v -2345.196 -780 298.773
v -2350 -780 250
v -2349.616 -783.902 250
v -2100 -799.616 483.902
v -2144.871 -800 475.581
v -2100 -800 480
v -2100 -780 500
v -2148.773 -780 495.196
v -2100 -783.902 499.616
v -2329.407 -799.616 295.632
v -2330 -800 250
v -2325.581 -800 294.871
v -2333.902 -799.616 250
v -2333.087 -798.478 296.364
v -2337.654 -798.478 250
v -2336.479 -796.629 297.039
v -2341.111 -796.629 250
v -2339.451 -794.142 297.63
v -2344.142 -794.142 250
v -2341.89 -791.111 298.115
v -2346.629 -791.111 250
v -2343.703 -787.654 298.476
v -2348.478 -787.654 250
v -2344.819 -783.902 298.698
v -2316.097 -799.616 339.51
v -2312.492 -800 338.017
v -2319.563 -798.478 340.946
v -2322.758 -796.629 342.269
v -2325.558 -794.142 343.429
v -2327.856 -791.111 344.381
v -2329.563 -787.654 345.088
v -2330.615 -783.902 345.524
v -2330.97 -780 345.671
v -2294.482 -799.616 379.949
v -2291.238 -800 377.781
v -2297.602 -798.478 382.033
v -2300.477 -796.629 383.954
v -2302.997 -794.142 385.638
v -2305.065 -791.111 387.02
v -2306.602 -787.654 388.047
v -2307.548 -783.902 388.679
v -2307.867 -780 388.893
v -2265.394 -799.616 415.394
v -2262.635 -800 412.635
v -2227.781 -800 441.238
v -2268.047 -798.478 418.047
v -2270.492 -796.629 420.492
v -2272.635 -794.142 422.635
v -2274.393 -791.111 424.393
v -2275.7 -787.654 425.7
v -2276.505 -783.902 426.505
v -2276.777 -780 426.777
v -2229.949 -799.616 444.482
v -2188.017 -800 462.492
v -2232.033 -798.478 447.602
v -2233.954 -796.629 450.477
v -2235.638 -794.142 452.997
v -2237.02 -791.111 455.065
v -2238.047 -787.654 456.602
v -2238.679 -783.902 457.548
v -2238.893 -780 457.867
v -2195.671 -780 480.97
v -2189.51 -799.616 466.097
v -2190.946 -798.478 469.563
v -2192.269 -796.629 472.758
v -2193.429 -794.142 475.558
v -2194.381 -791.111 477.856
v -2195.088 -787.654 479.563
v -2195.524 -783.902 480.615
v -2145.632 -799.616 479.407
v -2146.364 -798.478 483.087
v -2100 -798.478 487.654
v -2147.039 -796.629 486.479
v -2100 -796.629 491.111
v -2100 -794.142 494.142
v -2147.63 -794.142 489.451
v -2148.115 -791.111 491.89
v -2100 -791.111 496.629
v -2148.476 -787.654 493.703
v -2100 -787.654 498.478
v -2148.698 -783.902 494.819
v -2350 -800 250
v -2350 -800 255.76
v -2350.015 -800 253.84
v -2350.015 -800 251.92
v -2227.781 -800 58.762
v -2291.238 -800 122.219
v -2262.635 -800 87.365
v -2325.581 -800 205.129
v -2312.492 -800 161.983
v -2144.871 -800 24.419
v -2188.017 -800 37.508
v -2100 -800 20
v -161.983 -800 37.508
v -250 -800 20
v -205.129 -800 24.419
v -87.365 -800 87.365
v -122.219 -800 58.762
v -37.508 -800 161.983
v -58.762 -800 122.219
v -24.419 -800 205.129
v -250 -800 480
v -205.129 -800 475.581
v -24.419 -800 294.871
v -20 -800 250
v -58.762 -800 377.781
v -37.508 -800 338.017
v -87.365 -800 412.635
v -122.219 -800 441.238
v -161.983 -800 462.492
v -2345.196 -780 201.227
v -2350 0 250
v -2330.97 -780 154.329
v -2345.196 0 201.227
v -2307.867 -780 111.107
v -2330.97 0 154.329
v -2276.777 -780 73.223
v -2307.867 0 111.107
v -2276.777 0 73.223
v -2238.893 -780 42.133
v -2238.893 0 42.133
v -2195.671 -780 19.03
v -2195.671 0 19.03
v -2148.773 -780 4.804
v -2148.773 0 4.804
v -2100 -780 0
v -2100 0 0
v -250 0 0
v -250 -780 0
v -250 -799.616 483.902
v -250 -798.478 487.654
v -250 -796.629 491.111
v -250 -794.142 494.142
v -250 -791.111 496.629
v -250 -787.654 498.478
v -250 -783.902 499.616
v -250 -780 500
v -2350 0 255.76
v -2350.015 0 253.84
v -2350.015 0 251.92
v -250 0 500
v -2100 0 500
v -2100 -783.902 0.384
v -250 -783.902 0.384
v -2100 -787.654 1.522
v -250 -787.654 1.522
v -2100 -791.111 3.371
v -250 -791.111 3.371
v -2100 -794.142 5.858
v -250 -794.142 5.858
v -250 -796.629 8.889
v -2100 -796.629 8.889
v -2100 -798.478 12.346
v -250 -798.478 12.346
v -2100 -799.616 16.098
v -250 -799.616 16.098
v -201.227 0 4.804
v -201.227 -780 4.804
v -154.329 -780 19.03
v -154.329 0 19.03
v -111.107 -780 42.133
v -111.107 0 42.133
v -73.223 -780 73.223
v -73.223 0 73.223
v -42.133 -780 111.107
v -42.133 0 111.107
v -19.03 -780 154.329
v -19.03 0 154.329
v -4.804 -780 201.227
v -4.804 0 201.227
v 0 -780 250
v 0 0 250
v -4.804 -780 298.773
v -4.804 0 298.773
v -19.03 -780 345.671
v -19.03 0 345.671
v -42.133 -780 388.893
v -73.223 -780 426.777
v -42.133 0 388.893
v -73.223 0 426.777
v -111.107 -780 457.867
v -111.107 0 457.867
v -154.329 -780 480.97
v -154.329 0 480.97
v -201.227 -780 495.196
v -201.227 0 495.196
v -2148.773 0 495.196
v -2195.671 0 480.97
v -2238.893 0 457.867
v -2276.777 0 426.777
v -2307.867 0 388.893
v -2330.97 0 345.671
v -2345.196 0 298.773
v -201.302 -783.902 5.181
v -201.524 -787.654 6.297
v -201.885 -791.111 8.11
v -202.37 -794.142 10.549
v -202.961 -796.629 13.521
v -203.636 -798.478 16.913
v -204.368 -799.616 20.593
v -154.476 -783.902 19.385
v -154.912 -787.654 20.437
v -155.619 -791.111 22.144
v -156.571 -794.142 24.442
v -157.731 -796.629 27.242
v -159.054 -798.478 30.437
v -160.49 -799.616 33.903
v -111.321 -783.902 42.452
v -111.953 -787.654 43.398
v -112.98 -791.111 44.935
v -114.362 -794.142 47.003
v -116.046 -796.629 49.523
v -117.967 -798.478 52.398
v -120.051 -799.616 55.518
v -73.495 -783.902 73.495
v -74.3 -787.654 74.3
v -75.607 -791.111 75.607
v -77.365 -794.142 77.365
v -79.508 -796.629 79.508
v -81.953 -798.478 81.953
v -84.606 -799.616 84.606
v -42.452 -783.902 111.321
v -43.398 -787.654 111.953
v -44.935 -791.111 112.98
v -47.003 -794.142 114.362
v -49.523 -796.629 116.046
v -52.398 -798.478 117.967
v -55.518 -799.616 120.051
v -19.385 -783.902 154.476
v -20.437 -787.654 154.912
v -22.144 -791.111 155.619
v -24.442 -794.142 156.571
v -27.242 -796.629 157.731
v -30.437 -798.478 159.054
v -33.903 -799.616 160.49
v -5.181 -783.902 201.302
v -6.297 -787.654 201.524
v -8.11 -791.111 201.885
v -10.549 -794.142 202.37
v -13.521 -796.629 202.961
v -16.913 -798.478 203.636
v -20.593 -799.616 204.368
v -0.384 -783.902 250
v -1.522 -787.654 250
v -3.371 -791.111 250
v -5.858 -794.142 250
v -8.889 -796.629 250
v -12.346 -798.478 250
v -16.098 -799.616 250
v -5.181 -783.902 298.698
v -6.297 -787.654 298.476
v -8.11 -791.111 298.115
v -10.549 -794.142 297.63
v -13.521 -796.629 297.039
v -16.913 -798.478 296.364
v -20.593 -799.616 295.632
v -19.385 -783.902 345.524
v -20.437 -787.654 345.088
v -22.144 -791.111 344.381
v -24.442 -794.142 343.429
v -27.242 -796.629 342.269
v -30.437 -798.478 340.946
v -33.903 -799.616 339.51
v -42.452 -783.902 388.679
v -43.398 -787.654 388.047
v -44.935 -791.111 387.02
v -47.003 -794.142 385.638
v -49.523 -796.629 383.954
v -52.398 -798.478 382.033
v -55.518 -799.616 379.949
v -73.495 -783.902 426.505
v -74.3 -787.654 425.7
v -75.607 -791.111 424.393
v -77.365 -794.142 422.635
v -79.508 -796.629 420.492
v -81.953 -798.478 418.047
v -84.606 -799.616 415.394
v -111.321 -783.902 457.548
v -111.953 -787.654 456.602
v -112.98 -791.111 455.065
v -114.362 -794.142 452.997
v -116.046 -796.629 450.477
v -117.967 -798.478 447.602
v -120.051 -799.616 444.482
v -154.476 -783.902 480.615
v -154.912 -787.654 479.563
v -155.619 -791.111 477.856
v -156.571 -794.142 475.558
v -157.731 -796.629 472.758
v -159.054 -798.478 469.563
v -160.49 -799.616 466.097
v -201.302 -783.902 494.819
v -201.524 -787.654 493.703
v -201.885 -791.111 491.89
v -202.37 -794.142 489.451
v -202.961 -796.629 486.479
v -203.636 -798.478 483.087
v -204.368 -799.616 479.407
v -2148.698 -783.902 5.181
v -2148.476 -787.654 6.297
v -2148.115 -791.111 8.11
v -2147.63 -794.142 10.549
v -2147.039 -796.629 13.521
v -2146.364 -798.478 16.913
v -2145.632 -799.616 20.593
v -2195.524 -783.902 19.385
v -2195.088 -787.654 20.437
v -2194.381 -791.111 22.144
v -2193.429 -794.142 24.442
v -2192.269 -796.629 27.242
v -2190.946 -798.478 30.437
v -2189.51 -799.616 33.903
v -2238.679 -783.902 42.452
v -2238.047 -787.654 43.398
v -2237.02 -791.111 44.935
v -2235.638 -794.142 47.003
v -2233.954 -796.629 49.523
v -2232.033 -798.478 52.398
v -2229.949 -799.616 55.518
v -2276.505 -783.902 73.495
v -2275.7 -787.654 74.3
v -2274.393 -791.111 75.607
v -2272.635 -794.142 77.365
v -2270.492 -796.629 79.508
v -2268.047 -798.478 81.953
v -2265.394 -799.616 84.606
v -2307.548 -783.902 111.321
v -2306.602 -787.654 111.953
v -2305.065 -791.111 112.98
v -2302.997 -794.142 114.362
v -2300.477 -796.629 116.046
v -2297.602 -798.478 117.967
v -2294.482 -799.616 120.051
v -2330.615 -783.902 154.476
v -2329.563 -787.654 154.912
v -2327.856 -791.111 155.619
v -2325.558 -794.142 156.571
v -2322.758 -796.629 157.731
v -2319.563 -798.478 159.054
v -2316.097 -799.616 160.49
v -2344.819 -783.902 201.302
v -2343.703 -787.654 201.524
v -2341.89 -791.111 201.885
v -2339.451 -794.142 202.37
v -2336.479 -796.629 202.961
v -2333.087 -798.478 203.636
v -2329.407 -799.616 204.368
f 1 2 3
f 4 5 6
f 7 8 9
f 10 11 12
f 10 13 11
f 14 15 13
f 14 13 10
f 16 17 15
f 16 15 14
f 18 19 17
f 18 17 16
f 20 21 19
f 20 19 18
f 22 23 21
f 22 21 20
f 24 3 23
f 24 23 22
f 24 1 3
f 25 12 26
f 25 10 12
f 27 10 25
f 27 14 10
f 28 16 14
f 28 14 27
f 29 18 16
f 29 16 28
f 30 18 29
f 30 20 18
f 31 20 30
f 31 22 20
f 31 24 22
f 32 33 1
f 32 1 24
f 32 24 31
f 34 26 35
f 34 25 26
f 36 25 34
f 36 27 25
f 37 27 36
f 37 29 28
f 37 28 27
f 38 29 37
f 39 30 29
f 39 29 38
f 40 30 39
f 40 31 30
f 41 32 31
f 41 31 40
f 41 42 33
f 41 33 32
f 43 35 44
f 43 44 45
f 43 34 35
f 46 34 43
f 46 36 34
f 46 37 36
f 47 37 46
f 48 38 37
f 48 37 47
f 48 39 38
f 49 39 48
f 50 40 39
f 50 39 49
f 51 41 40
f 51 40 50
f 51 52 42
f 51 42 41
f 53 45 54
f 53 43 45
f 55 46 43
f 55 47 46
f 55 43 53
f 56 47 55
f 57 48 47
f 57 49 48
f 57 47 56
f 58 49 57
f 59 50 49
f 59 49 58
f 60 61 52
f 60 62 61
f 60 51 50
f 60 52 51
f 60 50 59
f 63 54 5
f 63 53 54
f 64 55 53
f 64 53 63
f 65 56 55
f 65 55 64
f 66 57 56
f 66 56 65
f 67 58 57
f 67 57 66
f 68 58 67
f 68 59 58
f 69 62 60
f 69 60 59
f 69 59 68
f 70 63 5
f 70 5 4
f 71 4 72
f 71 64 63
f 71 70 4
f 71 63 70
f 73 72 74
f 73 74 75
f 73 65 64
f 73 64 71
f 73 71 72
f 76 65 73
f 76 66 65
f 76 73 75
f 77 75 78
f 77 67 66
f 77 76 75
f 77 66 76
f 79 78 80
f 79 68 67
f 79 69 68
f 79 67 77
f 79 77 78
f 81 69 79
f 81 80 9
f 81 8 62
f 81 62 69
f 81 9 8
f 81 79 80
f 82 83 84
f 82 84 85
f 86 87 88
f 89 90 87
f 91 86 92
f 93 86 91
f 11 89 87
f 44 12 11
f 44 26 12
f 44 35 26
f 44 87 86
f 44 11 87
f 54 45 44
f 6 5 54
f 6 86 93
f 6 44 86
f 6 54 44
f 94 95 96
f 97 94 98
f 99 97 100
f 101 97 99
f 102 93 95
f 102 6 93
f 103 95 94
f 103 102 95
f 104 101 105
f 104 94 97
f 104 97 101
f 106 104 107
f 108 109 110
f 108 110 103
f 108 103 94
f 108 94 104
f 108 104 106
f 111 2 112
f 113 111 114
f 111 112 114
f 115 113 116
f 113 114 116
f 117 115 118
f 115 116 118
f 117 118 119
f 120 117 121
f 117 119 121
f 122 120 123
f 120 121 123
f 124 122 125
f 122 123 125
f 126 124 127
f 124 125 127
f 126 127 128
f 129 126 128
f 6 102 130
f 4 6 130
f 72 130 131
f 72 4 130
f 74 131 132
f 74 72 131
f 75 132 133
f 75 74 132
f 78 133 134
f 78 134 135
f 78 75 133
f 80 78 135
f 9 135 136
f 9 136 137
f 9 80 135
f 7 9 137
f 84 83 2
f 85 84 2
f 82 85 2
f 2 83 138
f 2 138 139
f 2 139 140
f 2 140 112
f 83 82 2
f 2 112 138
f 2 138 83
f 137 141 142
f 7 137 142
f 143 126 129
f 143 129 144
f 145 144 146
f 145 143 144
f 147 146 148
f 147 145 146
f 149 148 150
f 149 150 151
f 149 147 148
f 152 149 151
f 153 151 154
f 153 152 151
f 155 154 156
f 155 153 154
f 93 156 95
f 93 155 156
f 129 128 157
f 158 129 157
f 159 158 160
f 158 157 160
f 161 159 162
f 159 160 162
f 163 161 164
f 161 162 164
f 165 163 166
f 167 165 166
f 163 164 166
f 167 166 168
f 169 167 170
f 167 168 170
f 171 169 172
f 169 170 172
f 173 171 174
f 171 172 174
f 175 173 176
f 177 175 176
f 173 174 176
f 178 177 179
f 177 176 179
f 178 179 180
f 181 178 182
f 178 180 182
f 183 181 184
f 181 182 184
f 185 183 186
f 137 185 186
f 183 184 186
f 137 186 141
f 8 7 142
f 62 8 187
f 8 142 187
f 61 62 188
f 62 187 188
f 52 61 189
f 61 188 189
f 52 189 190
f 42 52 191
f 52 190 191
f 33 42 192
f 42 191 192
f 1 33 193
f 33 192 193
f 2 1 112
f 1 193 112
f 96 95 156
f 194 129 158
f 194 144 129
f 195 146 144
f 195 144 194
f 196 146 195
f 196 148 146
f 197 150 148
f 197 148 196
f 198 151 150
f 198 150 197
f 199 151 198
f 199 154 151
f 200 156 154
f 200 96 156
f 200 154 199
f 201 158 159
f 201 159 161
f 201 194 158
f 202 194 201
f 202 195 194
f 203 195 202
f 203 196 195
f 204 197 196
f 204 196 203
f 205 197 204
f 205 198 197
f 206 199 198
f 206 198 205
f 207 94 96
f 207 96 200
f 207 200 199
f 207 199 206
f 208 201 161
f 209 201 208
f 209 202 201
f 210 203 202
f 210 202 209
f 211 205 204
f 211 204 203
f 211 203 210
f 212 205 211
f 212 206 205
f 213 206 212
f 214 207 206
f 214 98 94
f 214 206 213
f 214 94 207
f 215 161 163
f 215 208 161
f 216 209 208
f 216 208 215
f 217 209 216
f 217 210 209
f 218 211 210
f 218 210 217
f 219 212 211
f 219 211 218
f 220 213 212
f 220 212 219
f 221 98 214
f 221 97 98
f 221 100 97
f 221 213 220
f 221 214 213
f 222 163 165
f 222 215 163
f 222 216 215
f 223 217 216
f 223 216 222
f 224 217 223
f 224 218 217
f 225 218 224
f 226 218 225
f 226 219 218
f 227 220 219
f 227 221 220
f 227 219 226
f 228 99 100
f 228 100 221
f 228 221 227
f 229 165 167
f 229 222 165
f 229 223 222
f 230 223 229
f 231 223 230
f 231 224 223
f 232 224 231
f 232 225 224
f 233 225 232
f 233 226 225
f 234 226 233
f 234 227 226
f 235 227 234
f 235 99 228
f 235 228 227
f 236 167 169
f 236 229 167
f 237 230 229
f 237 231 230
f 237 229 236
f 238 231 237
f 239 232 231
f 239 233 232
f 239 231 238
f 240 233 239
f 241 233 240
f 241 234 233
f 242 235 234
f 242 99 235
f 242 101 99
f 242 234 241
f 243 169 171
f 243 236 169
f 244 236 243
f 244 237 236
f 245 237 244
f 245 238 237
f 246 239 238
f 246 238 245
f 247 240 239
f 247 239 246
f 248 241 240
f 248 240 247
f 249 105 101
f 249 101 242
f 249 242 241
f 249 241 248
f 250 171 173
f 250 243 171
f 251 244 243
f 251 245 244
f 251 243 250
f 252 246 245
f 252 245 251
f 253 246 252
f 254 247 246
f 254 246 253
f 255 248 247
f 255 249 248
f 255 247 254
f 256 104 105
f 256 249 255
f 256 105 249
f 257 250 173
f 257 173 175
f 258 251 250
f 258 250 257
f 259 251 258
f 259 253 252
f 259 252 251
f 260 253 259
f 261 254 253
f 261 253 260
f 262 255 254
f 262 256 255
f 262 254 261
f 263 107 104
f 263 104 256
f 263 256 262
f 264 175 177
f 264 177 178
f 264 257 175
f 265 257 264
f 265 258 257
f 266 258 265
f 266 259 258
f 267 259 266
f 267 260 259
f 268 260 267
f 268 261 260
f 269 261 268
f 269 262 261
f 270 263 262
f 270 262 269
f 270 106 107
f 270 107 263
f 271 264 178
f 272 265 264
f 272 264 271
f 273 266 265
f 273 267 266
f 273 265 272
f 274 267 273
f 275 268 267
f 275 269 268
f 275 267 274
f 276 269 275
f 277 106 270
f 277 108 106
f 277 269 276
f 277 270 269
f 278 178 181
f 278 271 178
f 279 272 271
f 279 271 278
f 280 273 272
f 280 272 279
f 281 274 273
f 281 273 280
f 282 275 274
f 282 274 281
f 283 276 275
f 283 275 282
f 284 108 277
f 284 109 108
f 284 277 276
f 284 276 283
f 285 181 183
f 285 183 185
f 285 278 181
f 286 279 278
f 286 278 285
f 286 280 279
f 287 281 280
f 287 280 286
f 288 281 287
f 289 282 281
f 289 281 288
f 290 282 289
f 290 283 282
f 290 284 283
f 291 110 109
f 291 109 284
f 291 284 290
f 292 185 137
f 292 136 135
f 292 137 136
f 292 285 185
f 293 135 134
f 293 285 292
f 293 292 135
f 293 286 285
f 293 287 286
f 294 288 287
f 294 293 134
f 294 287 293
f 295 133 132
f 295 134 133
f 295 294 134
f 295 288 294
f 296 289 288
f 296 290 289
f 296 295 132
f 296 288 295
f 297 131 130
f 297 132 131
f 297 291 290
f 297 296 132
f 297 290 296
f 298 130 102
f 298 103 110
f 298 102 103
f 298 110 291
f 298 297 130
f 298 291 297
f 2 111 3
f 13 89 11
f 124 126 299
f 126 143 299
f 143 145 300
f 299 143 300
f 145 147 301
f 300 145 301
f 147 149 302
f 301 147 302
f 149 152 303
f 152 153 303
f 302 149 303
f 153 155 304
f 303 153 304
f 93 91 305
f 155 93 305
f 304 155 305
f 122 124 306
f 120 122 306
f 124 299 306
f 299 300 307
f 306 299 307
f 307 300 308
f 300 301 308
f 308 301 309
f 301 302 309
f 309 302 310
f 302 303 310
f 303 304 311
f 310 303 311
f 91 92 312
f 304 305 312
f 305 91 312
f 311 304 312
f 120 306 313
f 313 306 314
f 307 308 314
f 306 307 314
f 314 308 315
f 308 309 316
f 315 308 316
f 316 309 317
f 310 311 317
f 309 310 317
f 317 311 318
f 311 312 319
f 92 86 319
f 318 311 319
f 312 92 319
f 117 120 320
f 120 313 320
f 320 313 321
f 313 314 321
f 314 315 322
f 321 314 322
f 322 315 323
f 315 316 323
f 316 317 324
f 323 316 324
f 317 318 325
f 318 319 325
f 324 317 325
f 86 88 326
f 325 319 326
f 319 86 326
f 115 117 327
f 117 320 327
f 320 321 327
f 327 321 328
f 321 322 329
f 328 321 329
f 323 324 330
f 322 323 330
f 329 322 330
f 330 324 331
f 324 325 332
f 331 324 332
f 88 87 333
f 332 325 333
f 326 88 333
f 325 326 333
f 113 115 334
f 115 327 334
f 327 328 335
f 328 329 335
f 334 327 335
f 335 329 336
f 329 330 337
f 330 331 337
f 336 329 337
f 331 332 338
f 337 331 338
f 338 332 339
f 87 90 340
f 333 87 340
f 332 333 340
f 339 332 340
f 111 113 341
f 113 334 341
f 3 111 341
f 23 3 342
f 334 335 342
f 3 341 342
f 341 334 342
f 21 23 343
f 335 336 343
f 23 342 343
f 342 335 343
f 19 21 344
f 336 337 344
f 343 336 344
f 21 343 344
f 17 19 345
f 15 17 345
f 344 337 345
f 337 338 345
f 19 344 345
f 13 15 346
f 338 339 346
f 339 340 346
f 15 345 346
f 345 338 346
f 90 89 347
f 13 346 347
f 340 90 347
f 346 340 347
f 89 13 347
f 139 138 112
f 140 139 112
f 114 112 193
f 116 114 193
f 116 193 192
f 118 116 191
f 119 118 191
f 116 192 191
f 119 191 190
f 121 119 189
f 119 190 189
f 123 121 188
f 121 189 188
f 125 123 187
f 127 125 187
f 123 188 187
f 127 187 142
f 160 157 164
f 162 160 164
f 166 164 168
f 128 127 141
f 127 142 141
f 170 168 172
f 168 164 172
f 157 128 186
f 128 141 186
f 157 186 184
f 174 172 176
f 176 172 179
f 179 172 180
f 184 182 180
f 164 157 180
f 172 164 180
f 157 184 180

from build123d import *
from build123d import SkipClean  # not in build123d's __all__

# Parameters (mm, degrees)
F1_DEPTH    = 800
F2_T1_DEPTH = 1850
F2_T4_ANGLE = 180
F2_T6_ANGLE = 90
F2_T8_ANGLE = 90


# Not quite as in the source:
# - a fillet or chamfer that OpenCascade refuses, or shapes differently, is made with other operations: its cross-section is extruded or revolved along the edge and cut away or added


with BuildPart() as f1:
    # F0 (on Front) → F1 (new body)
    with BuildSketch(Plane.XZ):
        with BuildLine():
            ThreePointArc((-2350, 255.7604187137), (-2350.0164017124, 252.8802093568), (-2350, 250))
            Line((-2350, 250), (-2350, 255.7604187137))
        make_face()
        with BuildLine():
            Line((-2100, 0), (-250, 0))
            ThreePointArc((-250, 0), (0, 250), (-250, 500))
            Line((-250, 500), (-2100, 500))
            ThreePointArc((-2100, 500), (-2276.7766952966, 426.7766952966), (-2350, 250))
            ThreePointArc((-2350, 250), (-2276.7766952966, 73.2233047034), (-2100, 0))
        make_face()
    extrude(amount=F1_DEPTH)

    # F2: fillet of radius 20 on 5 edges, made by hand

    # F2_s2 → F2_t1 (cut)
    with BuildSketch(Plane.YZ.offset(-2100)):
        with BuildLine():
            ThreePointArc((-780, 0), (-794.1421356237, 5.8578643763), (-800, 20))
            Line((-800, 20), (-800, 0))
            Line((-800, 0), (-780, 0))
        make_face()
        with BuildLine():
            ThreePointArc((-800, 480), (-794.1421356237, 494.1421356237), (-780, 500))
            Line((-780, 500), (-800, 500))
            Line((-800, 500), (-800, 480))
        make_face()
    extrude(amount=F2_T1_DEPTH, mode=Mode.SUBTRACT)

    # F2_s3 → F2_t4 (revolve, cut)
    with BuildSketch(Plane.YZ.offset(-250)):
        with BuildLine():
            ThreePointArc((-780, 0), (-794.1421356237, 5.8578643763), (-800, 20))
            Line((-800, 20), (-800, 0))
            Line((-800, 0), (-780, 0))
        make_face()
    revolve(axis=Axis((-250, -800, 250), (0, -1, 0)), revolution_arc=F2_T4_ANGLE, mode=Mode.SUBTRACT)

    # F2_s5 → F2_t6 (revolve, cut)
    with BuildSketch(Plane.YZ.offset(-2100)):
        with BuildLine():
            ThreePointArc((-780, 0), (-794.1421356237, 5.8578643763), (-800, 20))
            Line((-800, 20), (-800, 0))
            Line((-800, 0), (-780, 0))
        make_face()
    revolve(axis=Axis((-2100, -800, 250), (0, 1, 0)), revolution_arc=F2_T6_ANGLE, mode=Mode.SUBTRACT)

    # F2_s7 → F2_t8 (revolve, cut)
    with BuildSketch(Plane.XY.offset(250)):
        with BuildLine():
            ThreePointArc((-2330, -800), (-2344.1421356237, -794.1421356237), (-2350, -780))
            Line((-2350, -780), (-2350, -800))
            Line((-2350, -800), (-2330, -800))
        make_face()
    with SkipClean():  # cleaning this boolean's faces spoils the solid; the shape is the same uncleaned
        revolve(axis=Axis((-2100, -800, 250), (0, 1, 0)), revolution_arc=F2_T8_ANGLE, mode=Mode.SUBTRACT)


solid = f1.part
